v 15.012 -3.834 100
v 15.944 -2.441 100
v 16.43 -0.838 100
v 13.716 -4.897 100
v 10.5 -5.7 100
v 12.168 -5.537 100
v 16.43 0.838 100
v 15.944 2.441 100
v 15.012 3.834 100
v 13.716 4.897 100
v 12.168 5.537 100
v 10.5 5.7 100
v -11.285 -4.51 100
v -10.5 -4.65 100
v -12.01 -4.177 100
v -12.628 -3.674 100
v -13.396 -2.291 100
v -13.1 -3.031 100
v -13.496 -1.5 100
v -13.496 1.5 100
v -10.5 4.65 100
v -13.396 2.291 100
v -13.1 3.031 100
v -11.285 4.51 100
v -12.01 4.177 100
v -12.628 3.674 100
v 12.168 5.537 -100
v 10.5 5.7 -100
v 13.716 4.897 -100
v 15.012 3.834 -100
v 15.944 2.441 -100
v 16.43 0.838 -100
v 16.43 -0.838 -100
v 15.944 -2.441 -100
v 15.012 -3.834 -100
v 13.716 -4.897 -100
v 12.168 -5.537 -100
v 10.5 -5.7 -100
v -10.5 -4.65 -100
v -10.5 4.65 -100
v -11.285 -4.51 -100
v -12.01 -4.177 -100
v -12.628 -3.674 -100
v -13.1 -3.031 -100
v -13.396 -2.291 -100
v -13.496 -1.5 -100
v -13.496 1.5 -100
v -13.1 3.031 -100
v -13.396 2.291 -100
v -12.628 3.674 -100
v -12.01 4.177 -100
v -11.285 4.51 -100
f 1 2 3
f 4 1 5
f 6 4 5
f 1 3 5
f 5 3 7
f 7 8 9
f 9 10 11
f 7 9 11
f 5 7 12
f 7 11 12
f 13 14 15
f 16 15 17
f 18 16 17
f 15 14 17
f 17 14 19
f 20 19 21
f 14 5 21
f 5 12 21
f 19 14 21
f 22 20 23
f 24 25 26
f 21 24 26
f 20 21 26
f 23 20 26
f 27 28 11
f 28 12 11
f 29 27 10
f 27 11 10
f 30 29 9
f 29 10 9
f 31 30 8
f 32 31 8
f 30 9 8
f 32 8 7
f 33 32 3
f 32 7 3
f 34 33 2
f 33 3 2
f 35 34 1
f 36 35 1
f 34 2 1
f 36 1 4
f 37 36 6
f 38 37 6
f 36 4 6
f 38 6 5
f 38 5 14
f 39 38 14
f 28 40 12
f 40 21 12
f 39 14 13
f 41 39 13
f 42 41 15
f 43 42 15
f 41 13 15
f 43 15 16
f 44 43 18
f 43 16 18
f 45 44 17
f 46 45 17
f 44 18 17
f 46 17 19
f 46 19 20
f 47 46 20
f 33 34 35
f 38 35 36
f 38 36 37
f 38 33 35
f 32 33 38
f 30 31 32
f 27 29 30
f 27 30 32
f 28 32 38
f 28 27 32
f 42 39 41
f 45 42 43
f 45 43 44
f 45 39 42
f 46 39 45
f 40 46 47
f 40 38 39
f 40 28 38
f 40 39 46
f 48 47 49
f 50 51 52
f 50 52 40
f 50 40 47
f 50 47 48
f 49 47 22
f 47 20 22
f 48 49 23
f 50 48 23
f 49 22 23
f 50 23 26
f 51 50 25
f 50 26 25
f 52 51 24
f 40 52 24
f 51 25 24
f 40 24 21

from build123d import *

# Parameters (mm, degrees)
BOSS_EXTRUDE1_DEPTH = 100


with BuildPart() as part:
    # Sketch1 → Boss-Extrude1 (new, symmetric)
    with BuildSketch(Plane.XY):
        with BuildLine():
            Line((-13.496435042, -1.5), (-13.496435042, 1.5))
            ThreePointArc((-13.496435042, 1.5), (-12.627675159, 3.673771087), (-10.5, 4.65))
            Line((-10.5, 4.65), (10.5, 5.7))
            ThreePointArc((10.5, 5.7), (16.492120552, 0), (10.5, -5.7))
            Line((10.5, -5.7), (-10.5, -4.65))
            ThreePointArc((-10.5, -4.65), (-12.627675159, -3.673771087), (-13.496435042, -1.5))
        make_face()
    extrude(amount=BOSS_EXTRUDE1_DEPTH, both=True)


solid = part.part
